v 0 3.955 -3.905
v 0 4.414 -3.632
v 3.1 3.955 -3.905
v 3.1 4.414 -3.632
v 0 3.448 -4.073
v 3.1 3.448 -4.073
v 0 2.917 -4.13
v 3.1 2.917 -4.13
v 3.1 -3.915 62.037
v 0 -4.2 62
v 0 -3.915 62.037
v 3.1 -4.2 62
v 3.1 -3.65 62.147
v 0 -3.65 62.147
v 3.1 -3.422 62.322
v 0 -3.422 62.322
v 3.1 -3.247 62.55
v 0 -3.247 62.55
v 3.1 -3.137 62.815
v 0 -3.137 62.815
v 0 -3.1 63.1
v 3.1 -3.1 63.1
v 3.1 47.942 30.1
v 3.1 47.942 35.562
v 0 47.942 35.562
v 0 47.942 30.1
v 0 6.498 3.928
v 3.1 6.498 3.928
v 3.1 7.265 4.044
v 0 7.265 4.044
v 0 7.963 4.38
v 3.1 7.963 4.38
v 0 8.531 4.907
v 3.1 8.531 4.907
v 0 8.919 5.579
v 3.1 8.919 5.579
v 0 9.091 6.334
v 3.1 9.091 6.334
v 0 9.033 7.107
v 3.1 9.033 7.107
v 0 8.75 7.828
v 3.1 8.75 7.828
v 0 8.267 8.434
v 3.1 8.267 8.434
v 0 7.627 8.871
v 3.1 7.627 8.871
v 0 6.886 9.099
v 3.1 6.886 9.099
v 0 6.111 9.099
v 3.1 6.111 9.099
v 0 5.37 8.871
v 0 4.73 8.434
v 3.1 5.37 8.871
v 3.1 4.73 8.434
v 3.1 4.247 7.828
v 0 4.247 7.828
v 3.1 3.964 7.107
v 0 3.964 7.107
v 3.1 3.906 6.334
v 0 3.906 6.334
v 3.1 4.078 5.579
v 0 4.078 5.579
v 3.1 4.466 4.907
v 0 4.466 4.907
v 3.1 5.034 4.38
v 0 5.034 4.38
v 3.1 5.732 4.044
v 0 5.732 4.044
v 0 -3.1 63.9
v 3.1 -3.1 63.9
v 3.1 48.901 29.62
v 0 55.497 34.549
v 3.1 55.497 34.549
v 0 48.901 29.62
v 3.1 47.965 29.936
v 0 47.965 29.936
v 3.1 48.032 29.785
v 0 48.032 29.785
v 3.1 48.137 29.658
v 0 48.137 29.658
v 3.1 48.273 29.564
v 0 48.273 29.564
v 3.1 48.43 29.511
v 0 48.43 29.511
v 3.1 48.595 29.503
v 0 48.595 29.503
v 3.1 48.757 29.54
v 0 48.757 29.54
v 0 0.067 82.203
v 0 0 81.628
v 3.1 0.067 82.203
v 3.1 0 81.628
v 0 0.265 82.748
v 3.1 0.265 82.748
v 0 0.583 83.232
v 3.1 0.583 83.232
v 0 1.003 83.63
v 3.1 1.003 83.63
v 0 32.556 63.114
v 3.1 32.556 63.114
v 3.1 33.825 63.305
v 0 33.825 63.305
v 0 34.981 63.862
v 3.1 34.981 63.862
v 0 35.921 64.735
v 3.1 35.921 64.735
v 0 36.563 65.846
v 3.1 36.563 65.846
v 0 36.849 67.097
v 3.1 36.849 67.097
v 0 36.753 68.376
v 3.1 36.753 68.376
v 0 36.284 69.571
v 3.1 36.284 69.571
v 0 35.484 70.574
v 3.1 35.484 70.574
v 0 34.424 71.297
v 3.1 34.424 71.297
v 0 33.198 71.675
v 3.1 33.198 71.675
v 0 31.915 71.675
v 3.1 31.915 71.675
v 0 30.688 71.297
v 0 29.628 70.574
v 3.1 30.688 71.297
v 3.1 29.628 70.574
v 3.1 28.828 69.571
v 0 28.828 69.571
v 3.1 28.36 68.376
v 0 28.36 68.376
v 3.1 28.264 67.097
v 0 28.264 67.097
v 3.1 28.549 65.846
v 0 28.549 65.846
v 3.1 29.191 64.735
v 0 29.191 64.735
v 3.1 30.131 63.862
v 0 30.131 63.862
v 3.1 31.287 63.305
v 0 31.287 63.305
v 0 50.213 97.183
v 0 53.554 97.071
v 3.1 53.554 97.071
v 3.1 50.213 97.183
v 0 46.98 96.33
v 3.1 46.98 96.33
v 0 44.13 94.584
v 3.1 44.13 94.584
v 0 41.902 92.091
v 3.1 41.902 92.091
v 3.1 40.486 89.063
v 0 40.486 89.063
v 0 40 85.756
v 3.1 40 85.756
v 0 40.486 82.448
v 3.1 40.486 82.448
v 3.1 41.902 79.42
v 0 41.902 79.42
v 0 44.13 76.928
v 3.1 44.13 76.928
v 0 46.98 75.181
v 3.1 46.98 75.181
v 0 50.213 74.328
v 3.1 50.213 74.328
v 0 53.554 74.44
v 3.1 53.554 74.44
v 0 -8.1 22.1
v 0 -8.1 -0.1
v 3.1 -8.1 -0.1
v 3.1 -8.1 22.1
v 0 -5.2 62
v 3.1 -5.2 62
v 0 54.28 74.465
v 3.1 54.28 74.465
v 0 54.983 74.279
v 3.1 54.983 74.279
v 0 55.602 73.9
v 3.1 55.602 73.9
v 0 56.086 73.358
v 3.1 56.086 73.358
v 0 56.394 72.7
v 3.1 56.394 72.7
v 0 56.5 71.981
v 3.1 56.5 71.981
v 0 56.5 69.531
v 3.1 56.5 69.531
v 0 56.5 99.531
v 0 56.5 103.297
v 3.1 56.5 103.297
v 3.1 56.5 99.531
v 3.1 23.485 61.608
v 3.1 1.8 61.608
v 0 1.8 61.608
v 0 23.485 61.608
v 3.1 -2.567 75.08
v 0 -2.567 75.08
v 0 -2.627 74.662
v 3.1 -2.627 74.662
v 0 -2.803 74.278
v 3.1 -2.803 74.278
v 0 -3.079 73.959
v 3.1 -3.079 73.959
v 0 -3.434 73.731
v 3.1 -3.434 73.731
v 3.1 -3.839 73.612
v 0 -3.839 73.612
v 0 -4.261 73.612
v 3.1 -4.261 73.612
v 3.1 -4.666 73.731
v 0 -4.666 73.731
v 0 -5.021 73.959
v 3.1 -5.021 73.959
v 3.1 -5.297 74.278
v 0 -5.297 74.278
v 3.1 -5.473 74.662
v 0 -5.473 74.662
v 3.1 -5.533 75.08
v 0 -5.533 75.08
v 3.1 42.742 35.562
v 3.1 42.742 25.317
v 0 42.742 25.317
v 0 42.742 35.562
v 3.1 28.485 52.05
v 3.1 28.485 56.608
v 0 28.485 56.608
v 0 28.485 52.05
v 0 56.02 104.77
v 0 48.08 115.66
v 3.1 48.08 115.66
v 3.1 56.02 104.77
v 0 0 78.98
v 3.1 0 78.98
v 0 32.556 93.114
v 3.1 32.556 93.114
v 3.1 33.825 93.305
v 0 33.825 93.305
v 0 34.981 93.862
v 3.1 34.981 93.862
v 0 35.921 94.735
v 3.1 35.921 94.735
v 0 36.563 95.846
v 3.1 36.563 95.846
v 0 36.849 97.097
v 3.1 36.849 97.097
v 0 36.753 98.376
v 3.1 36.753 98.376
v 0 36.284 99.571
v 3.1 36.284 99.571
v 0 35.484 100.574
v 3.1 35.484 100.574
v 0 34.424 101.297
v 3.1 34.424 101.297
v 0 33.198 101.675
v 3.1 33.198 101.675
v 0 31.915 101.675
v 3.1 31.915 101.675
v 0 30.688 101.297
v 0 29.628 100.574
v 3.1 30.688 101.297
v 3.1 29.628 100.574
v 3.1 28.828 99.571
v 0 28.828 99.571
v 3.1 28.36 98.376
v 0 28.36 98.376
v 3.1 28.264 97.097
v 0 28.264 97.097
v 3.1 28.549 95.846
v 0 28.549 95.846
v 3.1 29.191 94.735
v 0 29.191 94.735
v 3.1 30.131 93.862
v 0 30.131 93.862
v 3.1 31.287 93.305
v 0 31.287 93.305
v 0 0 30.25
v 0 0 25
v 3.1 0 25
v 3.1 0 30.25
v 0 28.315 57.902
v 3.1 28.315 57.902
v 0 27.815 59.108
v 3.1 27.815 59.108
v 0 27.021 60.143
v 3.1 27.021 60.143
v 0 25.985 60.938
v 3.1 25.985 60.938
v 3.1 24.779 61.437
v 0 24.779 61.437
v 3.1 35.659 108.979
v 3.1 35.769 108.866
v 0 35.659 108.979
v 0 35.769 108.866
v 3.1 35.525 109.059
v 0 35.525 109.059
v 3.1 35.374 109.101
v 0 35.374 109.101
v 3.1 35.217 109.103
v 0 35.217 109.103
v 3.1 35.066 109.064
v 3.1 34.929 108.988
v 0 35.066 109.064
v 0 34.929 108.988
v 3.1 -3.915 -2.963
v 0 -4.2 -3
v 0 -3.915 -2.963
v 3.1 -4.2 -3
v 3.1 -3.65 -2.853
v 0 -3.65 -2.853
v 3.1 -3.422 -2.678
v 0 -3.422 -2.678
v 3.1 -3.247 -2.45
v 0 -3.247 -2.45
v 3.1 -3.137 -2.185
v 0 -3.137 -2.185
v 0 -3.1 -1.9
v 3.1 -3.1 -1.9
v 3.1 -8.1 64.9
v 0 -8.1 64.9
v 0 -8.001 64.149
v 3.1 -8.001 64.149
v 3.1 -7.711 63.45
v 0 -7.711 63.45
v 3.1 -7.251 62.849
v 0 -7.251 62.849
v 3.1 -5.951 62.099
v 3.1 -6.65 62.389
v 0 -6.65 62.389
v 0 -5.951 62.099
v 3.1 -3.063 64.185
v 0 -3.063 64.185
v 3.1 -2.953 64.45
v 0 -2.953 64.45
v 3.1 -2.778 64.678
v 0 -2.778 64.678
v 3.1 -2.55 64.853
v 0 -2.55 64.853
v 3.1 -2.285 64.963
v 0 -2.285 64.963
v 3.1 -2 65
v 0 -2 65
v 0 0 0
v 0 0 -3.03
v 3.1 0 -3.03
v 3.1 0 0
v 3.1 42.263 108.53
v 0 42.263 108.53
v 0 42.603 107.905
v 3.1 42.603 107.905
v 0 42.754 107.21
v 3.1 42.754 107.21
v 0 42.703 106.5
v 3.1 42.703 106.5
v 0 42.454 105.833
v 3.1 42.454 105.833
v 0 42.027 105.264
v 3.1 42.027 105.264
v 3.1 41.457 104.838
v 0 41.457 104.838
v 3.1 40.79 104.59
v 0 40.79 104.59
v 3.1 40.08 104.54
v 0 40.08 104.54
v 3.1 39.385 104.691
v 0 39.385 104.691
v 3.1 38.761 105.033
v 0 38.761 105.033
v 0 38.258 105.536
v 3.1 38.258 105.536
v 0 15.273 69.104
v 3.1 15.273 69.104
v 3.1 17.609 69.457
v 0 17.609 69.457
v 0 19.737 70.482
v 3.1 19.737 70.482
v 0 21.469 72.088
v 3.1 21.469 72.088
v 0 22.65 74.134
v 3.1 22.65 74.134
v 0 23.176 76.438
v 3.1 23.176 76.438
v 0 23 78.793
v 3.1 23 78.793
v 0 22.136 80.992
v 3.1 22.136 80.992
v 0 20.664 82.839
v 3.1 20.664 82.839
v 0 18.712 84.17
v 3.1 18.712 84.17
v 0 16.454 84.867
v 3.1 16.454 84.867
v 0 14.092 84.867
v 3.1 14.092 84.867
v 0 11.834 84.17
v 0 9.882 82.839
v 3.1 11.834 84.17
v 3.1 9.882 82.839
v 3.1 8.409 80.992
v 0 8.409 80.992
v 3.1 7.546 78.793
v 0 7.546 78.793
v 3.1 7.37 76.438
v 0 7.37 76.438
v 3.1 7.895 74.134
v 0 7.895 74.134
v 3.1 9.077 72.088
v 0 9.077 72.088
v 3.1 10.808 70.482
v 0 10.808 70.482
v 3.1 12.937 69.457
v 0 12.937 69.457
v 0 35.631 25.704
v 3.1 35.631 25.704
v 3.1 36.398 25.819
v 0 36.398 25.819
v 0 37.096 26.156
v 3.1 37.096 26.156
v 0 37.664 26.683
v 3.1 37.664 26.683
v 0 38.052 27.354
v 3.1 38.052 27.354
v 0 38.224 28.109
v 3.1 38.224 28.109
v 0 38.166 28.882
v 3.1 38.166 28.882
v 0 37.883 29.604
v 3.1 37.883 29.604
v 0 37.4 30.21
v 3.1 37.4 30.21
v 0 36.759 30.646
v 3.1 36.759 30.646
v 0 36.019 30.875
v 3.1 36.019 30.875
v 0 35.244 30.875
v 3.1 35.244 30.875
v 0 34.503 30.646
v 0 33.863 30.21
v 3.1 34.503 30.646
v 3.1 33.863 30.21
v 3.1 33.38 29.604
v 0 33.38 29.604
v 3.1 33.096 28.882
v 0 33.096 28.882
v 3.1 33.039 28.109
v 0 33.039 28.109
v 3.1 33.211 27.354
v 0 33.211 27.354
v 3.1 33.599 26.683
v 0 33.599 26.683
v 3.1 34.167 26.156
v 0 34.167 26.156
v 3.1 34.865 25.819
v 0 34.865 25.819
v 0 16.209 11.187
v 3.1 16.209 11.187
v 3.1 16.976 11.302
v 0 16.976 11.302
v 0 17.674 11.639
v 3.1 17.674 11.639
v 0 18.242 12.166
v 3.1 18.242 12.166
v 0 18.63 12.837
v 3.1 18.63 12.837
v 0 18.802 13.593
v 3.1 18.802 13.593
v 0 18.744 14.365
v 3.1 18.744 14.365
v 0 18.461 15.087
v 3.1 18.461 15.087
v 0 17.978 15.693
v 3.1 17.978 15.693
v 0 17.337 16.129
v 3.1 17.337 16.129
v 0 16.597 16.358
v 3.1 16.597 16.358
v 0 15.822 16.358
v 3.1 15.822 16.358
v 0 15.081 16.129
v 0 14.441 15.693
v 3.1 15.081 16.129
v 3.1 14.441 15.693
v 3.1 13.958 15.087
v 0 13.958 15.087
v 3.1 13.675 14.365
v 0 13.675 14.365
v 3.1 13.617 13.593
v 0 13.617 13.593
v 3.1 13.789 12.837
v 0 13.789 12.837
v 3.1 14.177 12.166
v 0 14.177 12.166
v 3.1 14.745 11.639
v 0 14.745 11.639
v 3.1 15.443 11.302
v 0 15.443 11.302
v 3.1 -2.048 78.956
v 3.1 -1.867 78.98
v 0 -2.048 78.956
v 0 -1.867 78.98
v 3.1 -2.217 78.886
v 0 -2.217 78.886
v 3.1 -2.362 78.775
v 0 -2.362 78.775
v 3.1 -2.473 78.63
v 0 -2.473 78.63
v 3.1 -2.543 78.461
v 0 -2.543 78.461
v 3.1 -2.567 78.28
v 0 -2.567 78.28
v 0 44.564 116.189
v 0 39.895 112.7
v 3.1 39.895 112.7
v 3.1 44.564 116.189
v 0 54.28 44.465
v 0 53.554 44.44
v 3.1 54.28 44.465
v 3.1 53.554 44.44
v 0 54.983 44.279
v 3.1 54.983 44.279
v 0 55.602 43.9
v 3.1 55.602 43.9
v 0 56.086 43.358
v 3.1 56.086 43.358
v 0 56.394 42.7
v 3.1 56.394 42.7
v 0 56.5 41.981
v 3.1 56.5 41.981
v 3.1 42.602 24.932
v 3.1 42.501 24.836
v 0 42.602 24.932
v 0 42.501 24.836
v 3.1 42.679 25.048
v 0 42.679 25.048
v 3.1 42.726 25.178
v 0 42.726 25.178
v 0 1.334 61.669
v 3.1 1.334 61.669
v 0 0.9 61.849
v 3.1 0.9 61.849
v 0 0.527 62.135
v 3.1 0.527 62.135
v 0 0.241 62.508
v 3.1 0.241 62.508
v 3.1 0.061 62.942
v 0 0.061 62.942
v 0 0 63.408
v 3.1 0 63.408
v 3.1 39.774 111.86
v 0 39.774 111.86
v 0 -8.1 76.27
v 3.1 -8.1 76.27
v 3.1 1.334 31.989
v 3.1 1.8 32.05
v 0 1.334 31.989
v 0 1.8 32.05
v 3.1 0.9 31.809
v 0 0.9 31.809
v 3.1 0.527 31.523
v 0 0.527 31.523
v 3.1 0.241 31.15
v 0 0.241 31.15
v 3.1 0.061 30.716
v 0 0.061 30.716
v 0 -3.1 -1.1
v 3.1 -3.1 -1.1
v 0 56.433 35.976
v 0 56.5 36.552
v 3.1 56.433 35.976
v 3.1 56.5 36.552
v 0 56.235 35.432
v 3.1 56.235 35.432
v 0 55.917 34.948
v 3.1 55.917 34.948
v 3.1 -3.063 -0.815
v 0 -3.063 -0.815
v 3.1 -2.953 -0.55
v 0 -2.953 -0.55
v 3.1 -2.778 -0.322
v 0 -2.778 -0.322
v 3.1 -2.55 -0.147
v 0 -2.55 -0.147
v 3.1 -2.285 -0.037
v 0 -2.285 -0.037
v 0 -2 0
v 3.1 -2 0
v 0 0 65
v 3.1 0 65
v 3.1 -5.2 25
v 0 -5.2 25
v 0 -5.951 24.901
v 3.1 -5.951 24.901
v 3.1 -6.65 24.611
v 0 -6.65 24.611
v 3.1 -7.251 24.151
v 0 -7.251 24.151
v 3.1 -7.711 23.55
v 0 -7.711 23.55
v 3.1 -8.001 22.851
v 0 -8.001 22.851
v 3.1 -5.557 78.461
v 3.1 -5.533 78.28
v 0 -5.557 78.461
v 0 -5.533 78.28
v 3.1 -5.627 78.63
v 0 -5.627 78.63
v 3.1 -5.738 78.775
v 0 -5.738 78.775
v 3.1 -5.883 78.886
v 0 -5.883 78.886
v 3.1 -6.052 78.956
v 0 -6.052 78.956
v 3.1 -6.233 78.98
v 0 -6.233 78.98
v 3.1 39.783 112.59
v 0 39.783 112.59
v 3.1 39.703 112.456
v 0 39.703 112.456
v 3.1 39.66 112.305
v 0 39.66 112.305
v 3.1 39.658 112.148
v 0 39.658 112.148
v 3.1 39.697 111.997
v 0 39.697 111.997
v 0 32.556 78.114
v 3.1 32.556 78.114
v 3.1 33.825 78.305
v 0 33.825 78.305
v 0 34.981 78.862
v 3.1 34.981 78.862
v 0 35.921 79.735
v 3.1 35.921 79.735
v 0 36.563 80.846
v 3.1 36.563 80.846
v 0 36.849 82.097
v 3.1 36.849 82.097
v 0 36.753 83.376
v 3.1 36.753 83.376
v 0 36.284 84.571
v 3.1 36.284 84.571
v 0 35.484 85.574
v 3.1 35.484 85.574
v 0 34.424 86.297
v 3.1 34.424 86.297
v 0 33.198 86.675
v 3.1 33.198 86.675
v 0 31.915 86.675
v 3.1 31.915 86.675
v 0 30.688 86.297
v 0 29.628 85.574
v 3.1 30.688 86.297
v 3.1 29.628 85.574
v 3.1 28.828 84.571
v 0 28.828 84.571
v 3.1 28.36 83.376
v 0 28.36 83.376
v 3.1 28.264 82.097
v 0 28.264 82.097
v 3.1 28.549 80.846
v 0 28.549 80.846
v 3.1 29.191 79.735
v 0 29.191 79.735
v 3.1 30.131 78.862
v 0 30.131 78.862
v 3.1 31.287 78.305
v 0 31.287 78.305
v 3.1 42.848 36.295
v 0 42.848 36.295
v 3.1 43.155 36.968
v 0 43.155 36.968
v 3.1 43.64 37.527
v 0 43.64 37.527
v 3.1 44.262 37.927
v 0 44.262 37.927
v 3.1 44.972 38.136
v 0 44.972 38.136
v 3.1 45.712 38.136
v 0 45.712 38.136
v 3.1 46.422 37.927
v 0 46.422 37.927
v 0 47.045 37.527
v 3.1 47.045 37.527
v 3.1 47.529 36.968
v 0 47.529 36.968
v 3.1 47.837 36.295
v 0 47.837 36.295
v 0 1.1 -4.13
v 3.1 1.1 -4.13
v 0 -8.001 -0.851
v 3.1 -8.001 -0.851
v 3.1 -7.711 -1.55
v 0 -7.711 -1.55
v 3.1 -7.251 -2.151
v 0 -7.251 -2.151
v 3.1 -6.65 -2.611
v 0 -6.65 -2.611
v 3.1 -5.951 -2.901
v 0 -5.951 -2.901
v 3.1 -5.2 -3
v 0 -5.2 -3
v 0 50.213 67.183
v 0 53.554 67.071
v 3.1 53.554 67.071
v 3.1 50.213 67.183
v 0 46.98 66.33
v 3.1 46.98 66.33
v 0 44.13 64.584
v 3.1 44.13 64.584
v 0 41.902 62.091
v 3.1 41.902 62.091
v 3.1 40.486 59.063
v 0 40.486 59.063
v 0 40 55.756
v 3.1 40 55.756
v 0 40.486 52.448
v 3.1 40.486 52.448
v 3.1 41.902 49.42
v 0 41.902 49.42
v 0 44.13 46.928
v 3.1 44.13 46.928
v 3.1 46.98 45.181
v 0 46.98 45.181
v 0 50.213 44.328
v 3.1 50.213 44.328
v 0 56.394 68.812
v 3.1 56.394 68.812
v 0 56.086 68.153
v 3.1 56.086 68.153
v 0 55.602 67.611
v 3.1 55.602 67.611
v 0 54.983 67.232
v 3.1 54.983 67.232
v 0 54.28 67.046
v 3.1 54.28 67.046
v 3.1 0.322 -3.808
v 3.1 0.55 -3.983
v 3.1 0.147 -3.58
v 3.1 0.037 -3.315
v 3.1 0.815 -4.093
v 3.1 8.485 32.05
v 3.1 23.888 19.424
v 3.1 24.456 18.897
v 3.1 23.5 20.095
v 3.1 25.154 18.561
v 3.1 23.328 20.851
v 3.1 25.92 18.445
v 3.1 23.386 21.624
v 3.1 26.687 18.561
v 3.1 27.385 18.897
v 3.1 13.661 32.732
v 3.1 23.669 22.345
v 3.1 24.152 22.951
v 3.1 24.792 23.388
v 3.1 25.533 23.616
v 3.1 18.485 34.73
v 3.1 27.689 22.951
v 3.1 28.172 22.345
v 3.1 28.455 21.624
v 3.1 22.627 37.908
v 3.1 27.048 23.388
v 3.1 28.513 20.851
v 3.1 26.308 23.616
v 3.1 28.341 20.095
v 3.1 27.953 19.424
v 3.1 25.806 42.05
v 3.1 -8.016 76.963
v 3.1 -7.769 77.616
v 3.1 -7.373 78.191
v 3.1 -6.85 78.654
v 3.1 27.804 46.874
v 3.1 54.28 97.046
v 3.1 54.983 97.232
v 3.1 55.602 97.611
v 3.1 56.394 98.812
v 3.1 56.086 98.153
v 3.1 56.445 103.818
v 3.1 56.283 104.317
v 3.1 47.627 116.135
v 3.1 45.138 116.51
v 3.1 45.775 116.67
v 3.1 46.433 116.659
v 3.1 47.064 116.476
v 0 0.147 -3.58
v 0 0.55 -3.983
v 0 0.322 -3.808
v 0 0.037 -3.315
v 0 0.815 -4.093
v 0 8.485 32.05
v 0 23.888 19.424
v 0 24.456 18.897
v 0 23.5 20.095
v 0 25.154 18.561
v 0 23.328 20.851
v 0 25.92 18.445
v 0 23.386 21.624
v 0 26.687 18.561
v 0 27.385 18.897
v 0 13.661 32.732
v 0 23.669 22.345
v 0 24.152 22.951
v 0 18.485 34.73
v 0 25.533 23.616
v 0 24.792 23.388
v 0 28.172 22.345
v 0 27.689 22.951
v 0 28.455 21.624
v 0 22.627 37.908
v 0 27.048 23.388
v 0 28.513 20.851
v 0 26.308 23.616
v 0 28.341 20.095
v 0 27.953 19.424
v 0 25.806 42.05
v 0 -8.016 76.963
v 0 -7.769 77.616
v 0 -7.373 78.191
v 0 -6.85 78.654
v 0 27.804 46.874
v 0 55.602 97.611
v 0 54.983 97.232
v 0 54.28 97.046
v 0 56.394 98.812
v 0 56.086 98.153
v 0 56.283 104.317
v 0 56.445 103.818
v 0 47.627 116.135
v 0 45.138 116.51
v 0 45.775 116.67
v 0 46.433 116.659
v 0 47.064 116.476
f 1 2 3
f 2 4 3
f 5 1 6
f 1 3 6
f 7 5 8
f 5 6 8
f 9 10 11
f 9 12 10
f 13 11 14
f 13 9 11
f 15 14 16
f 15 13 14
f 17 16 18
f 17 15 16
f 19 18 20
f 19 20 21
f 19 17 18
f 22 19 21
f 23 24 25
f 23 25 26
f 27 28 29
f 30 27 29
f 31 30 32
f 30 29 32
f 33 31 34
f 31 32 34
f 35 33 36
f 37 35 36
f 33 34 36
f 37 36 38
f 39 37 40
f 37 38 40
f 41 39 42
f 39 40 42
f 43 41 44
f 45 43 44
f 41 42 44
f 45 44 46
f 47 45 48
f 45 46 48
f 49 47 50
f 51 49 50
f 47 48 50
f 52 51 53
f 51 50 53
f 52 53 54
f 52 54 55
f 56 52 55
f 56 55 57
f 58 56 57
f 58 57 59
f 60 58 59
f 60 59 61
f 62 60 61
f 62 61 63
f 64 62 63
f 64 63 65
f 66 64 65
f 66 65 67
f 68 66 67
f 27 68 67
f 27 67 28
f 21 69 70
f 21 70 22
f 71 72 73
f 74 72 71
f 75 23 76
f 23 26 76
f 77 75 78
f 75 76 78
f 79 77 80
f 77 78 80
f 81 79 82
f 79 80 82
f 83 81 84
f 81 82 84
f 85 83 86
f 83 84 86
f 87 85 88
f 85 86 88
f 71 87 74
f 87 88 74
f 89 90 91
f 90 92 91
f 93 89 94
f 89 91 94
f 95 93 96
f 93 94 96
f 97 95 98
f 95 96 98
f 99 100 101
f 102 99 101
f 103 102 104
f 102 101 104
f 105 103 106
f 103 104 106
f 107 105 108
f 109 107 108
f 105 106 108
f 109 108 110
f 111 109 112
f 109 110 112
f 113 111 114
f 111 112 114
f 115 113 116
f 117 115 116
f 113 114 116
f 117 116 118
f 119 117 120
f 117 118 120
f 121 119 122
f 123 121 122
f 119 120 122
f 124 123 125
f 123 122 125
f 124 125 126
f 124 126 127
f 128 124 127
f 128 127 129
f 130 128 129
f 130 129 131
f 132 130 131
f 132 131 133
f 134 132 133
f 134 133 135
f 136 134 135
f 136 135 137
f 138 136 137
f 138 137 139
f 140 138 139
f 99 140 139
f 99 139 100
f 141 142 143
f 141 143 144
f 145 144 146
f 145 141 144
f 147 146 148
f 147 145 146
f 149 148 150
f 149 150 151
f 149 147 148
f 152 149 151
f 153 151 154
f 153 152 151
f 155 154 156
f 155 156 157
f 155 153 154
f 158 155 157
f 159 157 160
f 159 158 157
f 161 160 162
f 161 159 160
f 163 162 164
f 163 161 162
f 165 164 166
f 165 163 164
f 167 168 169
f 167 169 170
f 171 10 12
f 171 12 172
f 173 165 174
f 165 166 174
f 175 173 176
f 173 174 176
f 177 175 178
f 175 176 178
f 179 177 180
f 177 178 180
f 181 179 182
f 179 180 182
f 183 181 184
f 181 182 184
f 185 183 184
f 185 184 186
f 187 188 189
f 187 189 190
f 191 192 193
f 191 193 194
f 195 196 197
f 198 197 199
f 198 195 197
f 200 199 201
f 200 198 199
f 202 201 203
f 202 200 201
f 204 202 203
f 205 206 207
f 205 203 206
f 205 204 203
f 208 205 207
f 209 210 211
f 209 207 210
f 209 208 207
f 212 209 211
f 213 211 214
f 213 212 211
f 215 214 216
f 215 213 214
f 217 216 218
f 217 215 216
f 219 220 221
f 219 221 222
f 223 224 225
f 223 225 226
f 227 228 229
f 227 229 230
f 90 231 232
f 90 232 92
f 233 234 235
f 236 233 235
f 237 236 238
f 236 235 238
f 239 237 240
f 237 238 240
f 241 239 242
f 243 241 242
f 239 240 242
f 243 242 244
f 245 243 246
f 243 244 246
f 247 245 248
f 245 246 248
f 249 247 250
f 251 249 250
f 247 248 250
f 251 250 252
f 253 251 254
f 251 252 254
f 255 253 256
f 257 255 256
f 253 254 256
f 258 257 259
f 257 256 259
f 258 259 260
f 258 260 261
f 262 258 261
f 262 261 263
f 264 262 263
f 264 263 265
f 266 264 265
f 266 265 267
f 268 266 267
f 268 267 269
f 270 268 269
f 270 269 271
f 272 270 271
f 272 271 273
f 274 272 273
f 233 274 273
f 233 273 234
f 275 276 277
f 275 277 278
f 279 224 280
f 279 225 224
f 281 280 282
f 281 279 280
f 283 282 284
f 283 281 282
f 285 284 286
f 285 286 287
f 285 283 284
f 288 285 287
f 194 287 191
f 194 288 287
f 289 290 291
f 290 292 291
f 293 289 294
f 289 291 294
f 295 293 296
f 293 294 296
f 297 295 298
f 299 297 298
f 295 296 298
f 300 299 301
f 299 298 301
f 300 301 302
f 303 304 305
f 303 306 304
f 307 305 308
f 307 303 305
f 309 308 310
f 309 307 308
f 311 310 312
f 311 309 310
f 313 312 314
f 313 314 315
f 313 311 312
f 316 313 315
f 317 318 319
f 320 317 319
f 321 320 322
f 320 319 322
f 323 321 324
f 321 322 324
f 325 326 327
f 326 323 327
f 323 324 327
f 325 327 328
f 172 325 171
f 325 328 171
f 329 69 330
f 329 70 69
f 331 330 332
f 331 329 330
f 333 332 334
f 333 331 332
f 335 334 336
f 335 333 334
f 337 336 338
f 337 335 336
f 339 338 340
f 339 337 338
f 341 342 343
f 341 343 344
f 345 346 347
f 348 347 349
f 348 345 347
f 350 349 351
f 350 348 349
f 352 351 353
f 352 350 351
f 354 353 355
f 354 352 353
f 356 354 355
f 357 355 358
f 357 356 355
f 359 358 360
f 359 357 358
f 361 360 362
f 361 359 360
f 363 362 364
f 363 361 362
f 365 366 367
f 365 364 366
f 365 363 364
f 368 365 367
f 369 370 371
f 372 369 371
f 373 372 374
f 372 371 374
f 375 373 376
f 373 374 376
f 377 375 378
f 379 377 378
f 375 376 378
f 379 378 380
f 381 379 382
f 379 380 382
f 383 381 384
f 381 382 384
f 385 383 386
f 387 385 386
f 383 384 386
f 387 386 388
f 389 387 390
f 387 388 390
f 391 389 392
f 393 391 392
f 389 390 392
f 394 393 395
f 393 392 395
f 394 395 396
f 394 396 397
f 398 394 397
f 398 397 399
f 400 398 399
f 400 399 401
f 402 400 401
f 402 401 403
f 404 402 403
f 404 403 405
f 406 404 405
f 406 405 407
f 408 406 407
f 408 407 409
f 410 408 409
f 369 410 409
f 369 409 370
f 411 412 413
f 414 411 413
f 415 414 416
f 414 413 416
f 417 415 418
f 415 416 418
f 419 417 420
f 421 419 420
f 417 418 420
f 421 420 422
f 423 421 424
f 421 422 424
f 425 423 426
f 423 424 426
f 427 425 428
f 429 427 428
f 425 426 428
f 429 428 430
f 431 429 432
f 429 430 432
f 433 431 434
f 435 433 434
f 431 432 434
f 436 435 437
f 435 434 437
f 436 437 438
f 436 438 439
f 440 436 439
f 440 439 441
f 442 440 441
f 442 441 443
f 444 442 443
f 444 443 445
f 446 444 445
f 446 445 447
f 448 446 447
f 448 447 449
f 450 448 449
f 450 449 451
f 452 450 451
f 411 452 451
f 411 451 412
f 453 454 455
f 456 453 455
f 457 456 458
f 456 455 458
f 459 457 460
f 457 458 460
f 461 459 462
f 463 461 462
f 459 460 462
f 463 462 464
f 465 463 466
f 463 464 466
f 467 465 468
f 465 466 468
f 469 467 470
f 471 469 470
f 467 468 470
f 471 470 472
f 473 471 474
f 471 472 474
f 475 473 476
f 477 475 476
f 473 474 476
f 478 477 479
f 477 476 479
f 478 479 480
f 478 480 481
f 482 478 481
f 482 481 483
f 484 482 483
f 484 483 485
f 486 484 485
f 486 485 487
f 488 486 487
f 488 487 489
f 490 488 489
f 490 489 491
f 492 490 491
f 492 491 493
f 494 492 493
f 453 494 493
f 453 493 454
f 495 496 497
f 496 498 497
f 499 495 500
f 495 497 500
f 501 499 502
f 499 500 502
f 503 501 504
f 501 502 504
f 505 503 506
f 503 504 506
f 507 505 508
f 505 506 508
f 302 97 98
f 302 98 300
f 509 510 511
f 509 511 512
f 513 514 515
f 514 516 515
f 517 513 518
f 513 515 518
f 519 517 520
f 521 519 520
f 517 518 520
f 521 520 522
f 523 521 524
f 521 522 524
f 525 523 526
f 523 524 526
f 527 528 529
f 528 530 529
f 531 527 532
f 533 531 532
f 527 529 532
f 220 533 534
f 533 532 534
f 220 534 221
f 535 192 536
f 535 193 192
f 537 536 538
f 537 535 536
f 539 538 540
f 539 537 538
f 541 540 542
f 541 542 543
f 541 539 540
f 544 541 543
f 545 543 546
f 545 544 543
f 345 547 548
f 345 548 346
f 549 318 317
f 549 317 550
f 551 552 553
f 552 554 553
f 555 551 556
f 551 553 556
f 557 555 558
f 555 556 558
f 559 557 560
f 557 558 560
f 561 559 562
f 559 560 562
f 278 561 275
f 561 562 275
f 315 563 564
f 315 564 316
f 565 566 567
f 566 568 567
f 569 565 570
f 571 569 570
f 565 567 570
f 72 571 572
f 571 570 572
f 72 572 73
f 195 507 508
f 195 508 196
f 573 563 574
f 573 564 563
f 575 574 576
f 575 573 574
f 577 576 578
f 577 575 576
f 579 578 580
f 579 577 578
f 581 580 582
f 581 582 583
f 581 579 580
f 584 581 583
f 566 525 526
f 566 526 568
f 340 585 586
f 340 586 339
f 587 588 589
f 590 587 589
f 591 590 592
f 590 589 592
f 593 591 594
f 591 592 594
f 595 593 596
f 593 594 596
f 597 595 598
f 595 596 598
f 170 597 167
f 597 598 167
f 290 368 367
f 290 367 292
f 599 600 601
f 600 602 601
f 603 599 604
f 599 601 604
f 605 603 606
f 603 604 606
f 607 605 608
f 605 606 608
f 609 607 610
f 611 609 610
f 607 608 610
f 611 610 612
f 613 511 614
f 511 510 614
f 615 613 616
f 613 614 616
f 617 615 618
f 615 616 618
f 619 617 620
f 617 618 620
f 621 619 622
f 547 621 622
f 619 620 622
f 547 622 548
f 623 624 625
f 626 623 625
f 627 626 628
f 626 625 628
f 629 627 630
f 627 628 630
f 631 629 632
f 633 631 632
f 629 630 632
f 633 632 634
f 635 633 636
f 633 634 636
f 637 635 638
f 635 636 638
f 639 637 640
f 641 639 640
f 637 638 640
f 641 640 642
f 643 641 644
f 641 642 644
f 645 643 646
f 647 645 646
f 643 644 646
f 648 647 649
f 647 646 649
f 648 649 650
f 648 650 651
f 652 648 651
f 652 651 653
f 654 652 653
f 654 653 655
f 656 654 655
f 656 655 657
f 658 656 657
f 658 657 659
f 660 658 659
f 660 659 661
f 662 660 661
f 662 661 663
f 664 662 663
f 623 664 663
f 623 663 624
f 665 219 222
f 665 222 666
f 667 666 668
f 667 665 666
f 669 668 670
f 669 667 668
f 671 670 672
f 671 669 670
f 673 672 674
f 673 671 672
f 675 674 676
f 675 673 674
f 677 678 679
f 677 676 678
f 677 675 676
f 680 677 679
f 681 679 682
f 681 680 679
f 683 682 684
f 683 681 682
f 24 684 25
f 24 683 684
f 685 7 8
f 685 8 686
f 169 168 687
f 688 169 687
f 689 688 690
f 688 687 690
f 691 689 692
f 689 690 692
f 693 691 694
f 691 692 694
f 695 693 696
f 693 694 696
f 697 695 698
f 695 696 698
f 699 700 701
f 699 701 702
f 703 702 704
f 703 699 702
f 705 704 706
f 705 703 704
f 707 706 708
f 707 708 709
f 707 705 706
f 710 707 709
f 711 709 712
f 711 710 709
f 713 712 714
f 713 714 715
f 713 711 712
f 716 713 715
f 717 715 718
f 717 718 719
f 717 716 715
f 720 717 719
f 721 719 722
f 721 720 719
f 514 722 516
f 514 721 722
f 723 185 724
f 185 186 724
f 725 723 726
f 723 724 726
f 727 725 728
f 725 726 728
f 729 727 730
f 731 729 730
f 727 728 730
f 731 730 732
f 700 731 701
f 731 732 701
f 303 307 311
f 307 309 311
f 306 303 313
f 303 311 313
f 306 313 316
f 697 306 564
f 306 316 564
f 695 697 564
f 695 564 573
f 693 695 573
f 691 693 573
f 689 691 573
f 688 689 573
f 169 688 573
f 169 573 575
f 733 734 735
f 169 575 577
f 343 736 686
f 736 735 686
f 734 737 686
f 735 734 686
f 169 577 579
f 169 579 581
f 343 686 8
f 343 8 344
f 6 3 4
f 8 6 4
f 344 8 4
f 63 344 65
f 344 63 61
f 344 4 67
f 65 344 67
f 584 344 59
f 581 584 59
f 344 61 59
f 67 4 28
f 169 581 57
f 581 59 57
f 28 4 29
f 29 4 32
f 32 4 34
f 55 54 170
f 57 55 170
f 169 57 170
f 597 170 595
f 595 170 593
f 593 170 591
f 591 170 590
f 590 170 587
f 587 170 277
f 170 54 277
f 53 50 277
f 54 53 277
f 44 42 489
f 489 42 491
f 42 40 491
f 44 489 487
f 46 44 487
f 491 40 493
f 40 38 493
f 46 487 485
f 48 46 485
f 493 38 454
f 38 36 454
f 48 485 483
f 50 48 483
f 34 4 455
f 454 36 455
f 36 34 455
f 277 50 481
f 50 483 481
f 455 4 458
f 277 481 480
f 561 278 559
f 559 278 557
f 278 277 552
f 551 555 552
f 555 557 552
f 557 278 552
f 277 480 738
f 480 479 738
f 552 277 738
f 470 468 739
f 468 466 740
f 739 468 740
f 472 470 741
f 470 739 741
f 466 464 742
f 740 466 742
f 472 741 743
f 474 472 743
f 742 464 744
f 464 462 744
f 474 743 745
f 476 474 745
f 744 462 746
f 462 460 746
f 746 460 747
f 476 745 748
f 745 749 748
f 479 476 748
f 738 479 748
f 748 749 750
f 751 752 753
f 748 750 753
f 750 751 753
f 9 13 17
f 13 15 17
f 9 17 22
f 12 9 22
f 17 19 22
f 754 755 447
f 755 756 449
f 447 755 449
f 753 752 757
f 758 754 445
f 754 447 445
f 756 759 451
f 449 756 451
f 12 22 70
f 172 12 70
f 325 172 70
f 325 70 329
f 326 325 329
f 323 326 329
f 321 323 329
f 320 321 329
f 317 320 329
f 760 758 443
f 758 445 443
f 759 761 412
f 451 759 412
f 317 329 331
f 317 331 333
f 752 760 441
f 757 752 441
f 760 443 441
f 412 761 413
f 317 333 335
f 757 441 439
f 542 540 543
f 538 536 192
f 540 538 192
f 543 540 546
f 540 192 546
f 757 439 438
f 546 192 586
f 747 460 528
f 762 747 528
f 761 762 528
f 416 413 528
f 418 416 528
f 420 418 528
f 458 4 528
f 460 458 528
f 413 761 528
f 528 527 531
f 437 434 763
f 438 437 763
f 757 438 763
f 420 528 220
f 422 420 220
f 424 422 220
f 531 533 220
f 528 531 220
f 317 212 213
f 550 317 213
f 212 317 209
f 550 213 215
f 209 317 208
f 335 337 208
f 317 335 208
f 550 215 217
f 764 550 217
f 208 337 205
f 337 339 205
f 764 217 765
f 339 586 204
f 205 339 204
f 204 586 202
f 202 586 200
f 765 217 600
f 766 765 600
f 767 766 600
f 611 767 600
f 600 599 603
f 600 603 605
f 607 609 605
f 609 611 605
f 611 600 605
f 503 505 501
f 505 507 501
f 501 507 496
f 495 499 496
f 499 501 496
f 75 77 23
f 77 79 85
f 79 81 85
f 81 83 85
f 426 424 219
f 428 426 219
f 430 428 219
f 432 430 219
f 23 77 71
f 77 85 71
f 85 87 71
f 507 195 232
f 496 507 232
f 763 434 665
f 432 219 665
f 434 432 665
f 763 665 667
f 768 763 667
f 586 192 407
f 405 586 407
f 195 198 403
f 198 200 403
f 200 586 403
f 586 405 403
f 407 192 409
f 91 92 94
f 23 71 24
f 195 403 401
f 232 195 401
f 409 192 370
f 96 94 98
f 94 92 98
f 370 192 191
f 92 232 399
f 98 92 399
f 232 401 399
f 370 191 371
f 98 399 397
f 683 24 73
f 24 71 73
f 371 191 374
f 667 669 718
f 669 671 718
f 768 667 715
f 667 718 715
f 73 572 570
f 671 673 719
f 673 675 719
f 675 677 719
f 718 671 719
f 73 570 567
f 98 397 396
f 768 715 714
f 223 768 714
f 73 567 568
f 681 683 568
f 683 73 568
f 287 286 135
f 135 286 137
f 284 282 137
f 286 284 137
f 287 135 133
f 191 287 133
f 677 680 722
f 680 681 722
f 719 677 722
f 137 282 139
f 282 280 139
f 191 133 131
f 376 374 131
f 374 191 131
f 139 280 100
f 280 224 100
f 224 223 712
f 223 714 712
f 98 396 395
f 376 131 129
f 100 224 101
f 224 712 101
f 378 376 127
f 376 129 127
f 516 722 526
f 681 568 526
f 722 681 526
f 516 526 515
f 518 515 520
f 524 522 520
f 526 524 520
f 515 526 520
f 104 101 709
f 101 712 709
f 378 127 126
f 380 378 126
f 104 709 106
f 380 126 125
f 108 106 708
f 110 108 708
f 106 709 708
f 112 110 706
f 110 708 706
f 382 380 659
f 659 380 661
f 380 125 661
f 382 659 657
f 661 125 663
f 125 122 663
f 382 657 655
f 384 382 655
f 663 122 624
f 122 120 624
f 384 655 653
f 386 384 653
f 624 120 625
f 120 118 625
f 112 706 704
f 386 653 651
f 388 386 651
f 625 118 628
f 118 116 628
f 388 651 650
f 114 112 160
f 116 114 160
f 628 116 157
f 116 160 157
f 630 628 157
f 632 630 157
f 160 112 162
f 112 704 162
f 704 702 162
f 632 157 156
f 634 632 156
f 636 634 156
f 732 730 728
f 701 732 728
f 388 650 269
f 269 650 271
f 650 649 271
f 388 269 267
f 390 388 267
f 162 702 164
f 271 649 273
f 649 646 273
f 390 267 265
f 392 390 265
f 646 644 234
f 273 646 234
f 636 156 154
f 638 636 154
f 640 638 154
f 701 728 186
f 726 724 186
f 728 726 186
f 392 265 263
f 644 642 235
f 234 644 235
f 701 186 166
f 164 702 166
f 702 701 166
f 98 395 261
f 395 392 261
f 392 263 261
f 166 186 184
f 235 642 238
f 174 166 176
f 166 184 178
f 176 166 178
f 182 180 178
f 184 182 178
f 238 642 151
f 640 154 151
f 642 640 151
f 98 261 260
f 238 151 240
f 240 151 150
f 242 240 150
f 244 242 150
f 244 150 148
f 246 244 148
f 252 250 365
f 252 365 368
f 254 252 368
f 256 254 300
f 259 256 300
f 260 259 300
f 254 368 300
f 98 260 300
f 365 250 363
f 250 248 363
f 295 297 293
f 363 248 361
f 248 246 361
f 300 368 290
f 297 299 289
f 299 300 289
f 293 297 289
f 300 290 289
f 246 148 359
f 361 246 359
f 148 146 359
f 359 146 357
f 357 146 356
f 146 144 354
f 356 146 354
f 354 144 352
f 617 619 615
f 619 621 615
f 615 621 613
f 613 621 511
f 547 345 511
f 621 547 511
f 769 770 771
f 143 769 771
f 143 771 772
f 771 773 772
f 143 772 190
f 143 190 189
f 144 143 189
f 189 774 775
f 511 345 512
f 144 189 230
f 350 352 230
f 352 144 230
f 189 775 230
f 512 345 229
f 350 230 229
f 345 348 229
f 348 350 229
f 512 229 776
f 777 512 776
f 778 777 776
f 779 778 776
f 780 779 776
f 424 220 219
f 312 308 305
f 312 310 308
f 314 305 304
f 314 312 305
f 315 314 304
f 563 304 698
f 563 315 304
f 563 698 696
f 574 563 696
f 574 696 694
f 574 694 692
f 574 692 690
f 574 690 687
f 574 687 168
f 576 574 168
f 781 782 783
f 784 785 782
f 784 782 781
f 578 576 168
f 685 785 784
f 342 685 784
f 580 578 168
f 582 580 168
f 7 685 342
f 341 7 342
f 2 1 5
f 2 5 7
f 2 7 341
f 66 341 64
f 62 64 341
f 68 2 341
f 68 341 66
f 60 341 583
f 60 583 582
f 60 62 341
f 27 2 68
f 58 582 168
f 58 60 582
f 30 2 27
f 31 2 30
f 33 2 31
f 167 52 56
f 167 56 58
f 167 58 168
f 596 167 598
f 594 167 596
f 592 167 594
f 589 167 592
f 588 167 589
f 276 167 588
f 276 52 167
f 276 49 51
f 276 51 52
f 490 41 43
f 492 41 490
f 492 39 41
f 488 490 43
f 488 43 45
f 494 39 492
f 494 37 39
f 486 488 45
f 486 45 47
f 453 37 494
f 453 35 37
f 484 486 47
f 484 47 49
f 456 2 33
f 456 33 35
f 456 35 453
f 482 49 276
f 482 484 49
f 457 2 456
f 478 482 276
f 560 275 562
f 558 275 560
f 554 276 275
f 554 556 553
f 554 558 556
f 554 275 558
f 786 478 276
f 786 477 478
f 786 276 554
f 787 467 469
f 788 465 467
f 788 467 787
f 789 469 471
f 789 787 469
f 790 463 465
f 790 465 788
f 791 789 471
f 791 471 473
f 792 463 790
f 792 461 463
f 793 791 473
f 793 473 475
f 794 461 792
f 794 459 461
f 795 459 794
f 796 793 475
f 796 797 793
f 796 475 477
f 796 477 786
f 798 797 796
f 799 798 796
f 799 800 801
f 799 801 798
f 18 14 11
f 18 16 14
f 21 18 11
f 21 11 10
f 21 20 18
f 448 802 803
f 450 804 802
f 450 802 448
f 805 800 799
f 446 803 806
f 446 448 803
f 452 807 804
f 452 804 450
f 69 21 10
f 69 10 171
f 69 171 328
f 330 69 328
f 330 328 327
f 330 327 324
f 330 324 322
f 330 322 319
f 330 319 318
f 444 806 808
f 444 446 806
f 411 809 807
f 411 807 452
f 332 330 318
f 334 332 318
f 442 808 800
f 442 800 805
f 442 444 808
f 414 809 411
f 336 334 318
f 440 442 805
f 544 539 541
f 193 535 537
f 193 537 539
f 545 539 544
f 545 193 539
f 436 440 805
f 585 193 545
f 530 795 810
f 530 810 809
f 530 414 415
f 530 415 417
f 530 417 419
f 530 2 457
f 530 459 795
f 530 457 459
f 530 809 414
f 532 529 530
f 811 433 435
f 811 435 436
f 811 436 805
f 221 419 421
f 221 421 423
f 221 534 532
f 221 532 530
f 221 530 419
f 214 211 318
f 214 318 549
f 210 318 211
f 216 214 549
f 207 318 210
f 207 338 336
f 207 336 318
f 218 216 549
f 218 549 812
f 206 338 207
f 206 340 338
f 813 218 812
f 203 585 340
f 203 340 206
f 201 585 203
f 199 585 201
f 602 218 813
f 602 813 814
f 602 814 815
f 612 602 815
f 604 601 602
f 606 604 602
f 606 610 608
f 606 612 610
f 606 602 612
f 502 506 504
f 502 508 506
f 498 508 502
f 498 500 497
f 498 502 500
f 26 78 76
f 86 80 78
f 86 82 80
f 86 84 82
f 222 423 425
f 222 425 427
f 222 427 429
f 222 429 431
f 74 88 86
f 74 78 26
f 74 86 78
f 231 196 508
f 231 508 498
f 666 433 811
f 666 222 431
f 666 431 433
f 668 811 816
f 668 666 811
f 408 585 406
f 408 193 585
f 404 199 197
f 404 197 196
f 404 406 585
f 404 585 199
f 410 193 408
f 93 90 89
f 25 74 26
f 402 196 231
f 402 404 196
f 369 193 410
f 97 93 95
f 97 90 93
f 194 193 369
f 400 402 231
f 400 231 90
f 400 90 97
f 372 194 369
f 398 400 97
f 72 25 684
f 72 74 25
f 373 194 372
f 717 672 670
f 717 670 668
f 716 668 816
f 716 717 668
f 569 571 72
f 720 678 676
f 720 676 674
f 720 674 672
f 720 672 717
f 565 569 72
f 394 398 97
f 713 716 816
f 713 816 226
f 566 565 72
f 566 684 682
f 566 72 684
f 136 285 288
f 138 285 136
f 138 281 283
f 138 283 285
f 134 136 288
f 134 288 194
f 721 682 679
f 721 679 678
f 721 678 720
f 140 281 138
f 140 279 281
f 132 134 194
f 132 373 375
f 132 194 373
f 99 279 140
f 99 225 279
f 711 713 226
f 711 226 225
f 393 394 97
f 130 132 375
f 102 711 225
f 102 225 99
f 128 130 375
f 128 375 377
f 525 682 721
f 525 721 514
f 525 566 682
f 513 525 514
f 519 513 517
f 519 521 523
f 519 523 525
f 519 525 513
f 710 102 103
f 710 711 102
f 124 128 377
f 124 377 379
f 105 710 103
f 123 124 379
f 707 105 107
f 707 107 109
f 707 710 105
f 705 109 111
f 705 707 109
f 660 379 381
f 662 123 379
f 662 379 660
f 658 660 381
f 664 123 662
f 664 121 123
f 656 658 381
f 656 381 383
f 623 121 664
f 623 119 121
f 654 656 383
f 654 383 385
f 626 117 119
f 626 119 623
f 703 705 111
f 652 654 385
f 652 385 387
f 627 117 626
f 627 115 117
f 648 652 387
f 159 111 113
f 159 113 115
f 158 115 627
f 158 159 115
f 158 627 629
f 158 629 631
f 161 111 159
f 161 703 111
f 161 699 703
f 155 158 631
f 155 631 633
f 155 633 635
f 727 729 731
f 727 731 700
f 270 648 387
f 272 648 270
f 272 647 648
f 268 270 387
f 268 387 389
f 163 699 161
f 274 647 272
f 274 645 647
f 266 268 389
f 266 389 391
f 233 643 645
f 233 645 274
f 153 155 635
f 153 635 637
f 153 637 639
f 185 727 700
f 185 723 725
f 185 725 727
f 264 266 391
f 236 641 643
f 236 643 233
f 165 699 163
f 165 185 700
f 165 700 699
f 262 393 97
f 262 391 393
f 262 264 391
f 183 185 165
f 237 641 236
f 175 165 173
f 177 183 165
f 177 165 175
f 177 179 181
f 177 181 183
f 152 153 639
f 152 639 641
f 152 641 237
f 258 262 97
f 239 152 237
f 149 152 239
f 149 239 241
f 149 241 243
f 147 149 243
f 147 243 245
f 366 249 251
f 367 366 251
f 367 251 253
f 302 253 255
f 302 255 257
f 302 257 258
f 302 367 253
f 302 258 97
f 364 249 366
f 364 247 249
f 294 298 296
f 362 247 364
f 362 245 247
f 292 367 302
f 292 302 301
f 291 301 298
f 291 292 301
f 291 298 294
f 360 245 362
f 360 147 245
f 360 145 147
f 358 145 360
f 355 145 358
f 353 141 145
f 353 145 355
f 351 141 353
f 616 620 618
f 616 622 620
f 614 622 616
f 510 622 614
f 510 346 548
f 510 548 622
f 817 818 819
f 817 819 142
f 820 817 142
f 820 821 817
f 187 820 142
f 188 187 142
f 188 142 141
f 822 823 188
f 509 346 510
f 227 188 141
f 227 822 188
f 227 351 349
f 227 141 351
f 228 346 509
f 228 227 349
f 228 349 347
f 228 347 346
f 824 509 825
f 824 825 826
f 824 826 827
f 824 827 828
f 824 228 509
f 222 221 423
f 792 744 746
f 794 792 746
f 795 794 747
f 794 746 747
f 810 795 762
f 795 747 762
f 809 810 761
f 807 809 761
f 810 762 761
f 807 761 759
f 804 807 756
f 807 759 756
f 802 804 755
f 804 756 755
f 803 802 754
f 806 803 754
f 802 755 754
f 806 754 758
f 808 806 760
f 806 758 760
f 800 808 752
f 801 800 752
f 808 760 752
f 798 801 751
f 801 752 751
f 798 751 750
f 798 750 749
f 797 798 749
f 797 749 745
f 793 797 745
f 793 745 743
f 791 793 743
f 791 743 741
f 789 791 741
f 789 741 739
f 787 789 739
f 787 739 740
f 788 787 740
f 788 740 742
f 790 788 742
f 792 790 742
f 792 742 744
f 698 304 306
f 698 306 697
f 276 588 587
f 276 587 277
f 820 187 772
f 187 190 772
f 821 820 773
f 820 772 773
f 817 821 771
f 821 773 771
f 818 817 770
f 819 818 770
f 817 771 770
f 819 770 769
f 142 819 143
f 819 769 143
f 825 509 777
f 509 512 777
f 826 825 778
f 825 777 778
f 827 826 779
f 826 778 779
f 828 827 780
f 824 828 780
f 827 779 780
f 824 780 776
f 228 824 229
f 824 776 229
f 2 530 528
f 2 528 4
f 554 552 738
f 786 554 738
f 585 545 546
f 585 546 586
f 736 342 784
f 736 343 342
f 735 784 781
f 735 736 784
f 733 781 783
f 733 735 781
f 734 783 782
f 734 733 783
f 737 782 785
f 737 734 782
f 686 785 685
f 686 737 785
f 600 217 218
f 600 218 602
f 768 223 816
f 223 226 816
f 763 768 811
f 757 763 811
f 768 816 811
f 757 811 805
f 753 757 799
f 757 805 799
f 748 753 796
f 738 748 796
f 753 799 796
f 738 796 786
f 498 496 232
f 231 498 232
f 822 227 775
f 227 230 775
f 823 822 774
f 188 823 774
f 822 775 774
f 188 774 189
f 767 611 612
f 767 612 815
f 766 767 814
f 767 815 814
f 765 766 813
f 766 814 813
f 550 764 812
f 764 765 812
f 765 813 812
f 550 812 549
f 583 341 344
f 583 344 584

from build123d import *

# Parameters (mm, degrees)
BOSS_EXTRUDE1_DEPTH = 3.1
FILLET1_R           = 2.5
FILLET2_R           = 1.1
SKETCH2_R           = 4.304443881
SKETCH2_R_2         = 7.925342076
SKETCH2_W           = 29.557408324
SKETCH2_H           = 28.485114527
CUT_EXTRUDE1_DEPTH  = 4
FILLET3_R           = 0.7
FILLET4_R           = 1.1
FILLET5_R           = 2.9
FILLET6_R           = 20
FILLET7_R           = 5
FILLET8_R           = 1.8
SKETCH4_R           = 2.6
CUT_EXTRUDE2_DEPTH  = 130.682927753
FILLET9_R           = 0.6


with BuildPart() as part:
    # Sketch1 → Boss-Extrude1 (new body)
    with BuildSketch(Plane(origin=(0, 0, 0), x_dir=(0, 0, -1), z_dir=(1, 0, 0))):
        with BuildLine():
            Line((0, 0), (0, -3.1))
            Line((0, -3.1), (3, -3.1))
            Line((3, -3.1), (3, -8.1))
            Line((3, -8.1), (-25, -8.1))
            Line((-25, -8.1), (-25, 0))
            Line((-25, 0), (-65, 0))
            Line((-65, 0), (-65, -3.1))
            Line((-65, -3.1), (-62, -3.1))
            Line((-62, -3.1), (-62, -8.1))
            Line((-62, -8.1), (-78.979671767, -8.1))
            Line((-78.979671767, -8.1), (-78.979671767, 0))
            Line((-78.979671767, 0), (-82.880201339, 0))
            Line((-82.880201339, 0), (-117.70382886, 46.590063892))
            Line((-117.70382886, 46.590063892), (-104.111751507, 56.5))
            Line((-104.111751507, 56.5), (-96.111751507, 56.5))
            ThreePointArc((-96.111751507, 56.5), (-85.755593918, 40), (-75.39943633, 56.5))
            Line((-75.39943633, 56.5), (-66.111751507, 56.5))
            ThreePointArc((-66.111751507, 56.5), (-55.755593918, 40), (-45.39943633, 56.5))
            Line((-45.39943633, 56.5), (-35.299167427, 56.5))
            Line((-35.299167427, 56.5), (4.130048311, 3.748181445))
            Line((4.130048311, 3.748181445), (4.130048311, 0))
            Line((4.130048311, 0), (0, 0))
        make_face()
    extrude(amount=BOSS_EXTRUDE1_DEPTH)

    # Fillet1
    fillet1_edges = [part.edges().sort_by_distance(p)[0] for p in [
        (1.55, 0, 82.880201339),
        (1.55, 46.590063892, 117.70382886),
        (1.55, 56.5, 104.111751507),
        (1.55, 56.5, 96.111751507),
        (1.55, 56.5, 75.39943633),
        (1.55, 56.5, 66.111751507),
        (1.55, 56.5, 45.39943633),
        (1.55, 56.5, 35.299167427),
        (1.55, 3.748181445, -4.130048311),
    ]]
    fillet(fillet1_edges, radius=FILLET1_R)

    # Fillet2
    fillet2_edges = [part.edges().sort_by_distance(p)[0] for p in [
        (1.55, 0, -4.130048311),
    ]]
    fillet(fillet2_edges, radius=FILLET2_R)

    # Sketch2 → Cut-Extrude1 (cut)
    with BuildSketch(Plane(origin=(3.1, 0, 0), x_dir=(0, 0, -1), z_dir=(1, 0, 0))):
        with Locations((-97.418386441, 32.55612307)):
            Circle(SKETCH2_R)
        with Locations((-77.029808816, 15.272951492)):
            Circle(SKETCH2_R_2)
        with Locations((-82.418386441, 32.55612307)):
            Circle(SKETCH2_R)
        with Locations((-67.418386441, 32.55612307)):
            Circle(SKETCH2_R)
        with BuildLine():
            Line((-78.979671767, -2.567225462), (-75.079945866, -2.567225462))
            ThreePointArc((-75.079945866, -2.567225462), (-73.597171327, -4.05), (-75.079945866, -5.532774538))
            Line((-75.079945866, -5.532774538), (-78.979671767, -5.532774538))
            ThreePointArc((-78.979671767, -5.532774538), (-80.462446305, -4.05), (-78.979671767, -2.567225462))
        make_face()
        with Locations((-46.829052789, 14.242557264)):
            Rectangle(SKETCH2_W, SKETCH2_H)
    extrude(amount=-CUT_EXTRUDE1_DEPTH, mode=Mode.SUBTRACT)

    # Fillet3
    fillet3_edges = [part.edges().sort_by_distance(p)[0] for p in [
        (1.55, -2.567225462, 78.979671767),
        (1.55, -5.532774538, 78.979671767),
    ]]
    fillet(fillet3_edges, radius=FILLET3_R)

    # Fillet4
    fillet4_edges = [part.edges().sort_by_distance(p)[0] for p in [
        (1.55, -3.1, 0),
        (1.55, -3.1, -3),
        (1.55, -3.1, 65),
        (1.55, -3.1, 62),
    ]]
    fillet(fillet4_edges, radius=FILLET4_R)

    # Fillet5
    # the kernel refuses this fillet: 2.9 mm, written as the material it takes off along each edge
    with BuildSketch(Plane(origin=(-7.25, -8.1, -3), x_dir=(0, 0, 1), z_dir=(1, 0, 0)), Plane(origin=(-7.25, -8.1, 25), x_dir=(0, 1, 0), z_dir=(1, 0, 0))) as fillet5_piece_1:
        with BuildLine():
            CenterArc((FILLET5_R, -FILLET5_R), FILLET5_R, 90, 90)
            Line((0, -FILLET5_R), (0, 0))
            Line((0, 0), (FILLET5_R, 0))
        make_face()
    extrude(amount=17.6, mode=Mode.SUBTRACT)
    with BuildSketch(Plane(origin=(-7.25, -8.1, 62), x_dir=(0, 1, 0), z_dir=(1, 0, 0))) as fillet5_piece_2:
        with BuildLine():
            CenterArc((FILLET5_R, FILLET5_R), FILLET5_R, 180, 90)
            Line((0, FILLET5_R), (0, 0))
            Line((0, 0), (FILLET5_R, 0))
        make_face()
    extrude(amount=17.6, mode=Mode.SUBTRACT)
    with BuildSketch(Plane(origin=(-6.774666391, -8.1, 78.979671767), x_dir=(0, 0, -1), z_dir=(1, 0, 0))) as fillet5_piece_3:
        with BuildLine():
            CenterArc((2.709866556, 2.9), FILLET5_R, 200.862663323, 69.137336677)
            Line((0, 1.867225462), (0, 0))
            Line((0, 0), (2.709866556, 0))
        make_face()
    extrude(amount=16.649332781, mode=Mode.SUBTRACT)

    # Fillet6
    fillet6_edges = [part.edges().sort_by_distance(p)[0] for p in [
        (1.55, 28.485114527, 32.050348627),
    ]]
    fillet(fillet6_edges, radius=FILLET6_R)

    # Fillet7
    fillet7_edges = [part.edges().sort_by_distance(p)[0] for p in [
        (1.55, 28.485114527, 61.607756951),
    ]]
    fillet(fillet7_edges, radius=FILLET7_R)

    # Fillet8
    fillet8_edges = [part.edges().sort_by_distance(p)[0] for p in [
        (1.55, 0, 61.607756951),
        (1.55, 0, 32.050348627),
    ]]
    fillet(fillet8_edges, radius=FILLET8_R)

    # Sketch4 → Cut-Extrude2 (cut, through all)
    with BuildSketch(Plane(origin=(3.1, 0, 0), x_dir=(0, 0, -1), z_dir=(1, 0, 0))):
        with Locations((-28.303725911, 35.631276326)):
            Circle(SKETCH4_R)
        with Locations((-21.045298439, 25.920323627)):
            Circle(SKETCH4_R)
        with Locations((-13.786870968, 16.209370928)):
            Circle(SKETCH4_R)
        with Locations((-6.528443496, 6.498418229)):
            Circle(SKETCH4_R)
        with BuildLine():
            Line((-35.562153383, 47.942229025), (-28.90268277, 47.942229025))
            Line((-28.90268277, 47.942229025), (-25.015955687, 42.742229025))
            Line((-25.015955687, 42.742229025), (-35.562153383, 42.742229025))
            ThreePointArc((-35.562153383, 42.742229025), (-38.162153383, 45.342229025), (-35.562153383, 47.942229025))
        make_face()
        with BuildLine():
            Line((-112.340464073, 39.414490126), (-108.529774826, 42.262780338))
            ThreePointArc((-108.529774826, 42.262780338), (-105.030597304, 41.757056436), (-105.536321205, 38.257878913))
            Line((-105.536321205, 38.257878913), (-109.347010452, 35.409588702))
            ThreePointArc((-109.347010452, 35.409588702), (-112.846187975, 35.915312603), (-112.340464073, 39.414490126))
        make_face()
    extrude(amount=-CUT_EXTRUDE2_DEPTH, mode=Mode.SUBTRACT)

    # Fillet9
    fillet9_edges = [part.edges().sort_by_distance(p)[0] for p in [
        (1.55, 47.942229025, 28.90268277),
        (1.55, 42.742229025, 25.015955687),
        (1.55, 35.409588702, 109.347010452),
        (1.55, 39.414490126, 112.340464073),
    ]]
    fillet(fillet9_edges, radius=FILLET9_R)


solid = part.part
